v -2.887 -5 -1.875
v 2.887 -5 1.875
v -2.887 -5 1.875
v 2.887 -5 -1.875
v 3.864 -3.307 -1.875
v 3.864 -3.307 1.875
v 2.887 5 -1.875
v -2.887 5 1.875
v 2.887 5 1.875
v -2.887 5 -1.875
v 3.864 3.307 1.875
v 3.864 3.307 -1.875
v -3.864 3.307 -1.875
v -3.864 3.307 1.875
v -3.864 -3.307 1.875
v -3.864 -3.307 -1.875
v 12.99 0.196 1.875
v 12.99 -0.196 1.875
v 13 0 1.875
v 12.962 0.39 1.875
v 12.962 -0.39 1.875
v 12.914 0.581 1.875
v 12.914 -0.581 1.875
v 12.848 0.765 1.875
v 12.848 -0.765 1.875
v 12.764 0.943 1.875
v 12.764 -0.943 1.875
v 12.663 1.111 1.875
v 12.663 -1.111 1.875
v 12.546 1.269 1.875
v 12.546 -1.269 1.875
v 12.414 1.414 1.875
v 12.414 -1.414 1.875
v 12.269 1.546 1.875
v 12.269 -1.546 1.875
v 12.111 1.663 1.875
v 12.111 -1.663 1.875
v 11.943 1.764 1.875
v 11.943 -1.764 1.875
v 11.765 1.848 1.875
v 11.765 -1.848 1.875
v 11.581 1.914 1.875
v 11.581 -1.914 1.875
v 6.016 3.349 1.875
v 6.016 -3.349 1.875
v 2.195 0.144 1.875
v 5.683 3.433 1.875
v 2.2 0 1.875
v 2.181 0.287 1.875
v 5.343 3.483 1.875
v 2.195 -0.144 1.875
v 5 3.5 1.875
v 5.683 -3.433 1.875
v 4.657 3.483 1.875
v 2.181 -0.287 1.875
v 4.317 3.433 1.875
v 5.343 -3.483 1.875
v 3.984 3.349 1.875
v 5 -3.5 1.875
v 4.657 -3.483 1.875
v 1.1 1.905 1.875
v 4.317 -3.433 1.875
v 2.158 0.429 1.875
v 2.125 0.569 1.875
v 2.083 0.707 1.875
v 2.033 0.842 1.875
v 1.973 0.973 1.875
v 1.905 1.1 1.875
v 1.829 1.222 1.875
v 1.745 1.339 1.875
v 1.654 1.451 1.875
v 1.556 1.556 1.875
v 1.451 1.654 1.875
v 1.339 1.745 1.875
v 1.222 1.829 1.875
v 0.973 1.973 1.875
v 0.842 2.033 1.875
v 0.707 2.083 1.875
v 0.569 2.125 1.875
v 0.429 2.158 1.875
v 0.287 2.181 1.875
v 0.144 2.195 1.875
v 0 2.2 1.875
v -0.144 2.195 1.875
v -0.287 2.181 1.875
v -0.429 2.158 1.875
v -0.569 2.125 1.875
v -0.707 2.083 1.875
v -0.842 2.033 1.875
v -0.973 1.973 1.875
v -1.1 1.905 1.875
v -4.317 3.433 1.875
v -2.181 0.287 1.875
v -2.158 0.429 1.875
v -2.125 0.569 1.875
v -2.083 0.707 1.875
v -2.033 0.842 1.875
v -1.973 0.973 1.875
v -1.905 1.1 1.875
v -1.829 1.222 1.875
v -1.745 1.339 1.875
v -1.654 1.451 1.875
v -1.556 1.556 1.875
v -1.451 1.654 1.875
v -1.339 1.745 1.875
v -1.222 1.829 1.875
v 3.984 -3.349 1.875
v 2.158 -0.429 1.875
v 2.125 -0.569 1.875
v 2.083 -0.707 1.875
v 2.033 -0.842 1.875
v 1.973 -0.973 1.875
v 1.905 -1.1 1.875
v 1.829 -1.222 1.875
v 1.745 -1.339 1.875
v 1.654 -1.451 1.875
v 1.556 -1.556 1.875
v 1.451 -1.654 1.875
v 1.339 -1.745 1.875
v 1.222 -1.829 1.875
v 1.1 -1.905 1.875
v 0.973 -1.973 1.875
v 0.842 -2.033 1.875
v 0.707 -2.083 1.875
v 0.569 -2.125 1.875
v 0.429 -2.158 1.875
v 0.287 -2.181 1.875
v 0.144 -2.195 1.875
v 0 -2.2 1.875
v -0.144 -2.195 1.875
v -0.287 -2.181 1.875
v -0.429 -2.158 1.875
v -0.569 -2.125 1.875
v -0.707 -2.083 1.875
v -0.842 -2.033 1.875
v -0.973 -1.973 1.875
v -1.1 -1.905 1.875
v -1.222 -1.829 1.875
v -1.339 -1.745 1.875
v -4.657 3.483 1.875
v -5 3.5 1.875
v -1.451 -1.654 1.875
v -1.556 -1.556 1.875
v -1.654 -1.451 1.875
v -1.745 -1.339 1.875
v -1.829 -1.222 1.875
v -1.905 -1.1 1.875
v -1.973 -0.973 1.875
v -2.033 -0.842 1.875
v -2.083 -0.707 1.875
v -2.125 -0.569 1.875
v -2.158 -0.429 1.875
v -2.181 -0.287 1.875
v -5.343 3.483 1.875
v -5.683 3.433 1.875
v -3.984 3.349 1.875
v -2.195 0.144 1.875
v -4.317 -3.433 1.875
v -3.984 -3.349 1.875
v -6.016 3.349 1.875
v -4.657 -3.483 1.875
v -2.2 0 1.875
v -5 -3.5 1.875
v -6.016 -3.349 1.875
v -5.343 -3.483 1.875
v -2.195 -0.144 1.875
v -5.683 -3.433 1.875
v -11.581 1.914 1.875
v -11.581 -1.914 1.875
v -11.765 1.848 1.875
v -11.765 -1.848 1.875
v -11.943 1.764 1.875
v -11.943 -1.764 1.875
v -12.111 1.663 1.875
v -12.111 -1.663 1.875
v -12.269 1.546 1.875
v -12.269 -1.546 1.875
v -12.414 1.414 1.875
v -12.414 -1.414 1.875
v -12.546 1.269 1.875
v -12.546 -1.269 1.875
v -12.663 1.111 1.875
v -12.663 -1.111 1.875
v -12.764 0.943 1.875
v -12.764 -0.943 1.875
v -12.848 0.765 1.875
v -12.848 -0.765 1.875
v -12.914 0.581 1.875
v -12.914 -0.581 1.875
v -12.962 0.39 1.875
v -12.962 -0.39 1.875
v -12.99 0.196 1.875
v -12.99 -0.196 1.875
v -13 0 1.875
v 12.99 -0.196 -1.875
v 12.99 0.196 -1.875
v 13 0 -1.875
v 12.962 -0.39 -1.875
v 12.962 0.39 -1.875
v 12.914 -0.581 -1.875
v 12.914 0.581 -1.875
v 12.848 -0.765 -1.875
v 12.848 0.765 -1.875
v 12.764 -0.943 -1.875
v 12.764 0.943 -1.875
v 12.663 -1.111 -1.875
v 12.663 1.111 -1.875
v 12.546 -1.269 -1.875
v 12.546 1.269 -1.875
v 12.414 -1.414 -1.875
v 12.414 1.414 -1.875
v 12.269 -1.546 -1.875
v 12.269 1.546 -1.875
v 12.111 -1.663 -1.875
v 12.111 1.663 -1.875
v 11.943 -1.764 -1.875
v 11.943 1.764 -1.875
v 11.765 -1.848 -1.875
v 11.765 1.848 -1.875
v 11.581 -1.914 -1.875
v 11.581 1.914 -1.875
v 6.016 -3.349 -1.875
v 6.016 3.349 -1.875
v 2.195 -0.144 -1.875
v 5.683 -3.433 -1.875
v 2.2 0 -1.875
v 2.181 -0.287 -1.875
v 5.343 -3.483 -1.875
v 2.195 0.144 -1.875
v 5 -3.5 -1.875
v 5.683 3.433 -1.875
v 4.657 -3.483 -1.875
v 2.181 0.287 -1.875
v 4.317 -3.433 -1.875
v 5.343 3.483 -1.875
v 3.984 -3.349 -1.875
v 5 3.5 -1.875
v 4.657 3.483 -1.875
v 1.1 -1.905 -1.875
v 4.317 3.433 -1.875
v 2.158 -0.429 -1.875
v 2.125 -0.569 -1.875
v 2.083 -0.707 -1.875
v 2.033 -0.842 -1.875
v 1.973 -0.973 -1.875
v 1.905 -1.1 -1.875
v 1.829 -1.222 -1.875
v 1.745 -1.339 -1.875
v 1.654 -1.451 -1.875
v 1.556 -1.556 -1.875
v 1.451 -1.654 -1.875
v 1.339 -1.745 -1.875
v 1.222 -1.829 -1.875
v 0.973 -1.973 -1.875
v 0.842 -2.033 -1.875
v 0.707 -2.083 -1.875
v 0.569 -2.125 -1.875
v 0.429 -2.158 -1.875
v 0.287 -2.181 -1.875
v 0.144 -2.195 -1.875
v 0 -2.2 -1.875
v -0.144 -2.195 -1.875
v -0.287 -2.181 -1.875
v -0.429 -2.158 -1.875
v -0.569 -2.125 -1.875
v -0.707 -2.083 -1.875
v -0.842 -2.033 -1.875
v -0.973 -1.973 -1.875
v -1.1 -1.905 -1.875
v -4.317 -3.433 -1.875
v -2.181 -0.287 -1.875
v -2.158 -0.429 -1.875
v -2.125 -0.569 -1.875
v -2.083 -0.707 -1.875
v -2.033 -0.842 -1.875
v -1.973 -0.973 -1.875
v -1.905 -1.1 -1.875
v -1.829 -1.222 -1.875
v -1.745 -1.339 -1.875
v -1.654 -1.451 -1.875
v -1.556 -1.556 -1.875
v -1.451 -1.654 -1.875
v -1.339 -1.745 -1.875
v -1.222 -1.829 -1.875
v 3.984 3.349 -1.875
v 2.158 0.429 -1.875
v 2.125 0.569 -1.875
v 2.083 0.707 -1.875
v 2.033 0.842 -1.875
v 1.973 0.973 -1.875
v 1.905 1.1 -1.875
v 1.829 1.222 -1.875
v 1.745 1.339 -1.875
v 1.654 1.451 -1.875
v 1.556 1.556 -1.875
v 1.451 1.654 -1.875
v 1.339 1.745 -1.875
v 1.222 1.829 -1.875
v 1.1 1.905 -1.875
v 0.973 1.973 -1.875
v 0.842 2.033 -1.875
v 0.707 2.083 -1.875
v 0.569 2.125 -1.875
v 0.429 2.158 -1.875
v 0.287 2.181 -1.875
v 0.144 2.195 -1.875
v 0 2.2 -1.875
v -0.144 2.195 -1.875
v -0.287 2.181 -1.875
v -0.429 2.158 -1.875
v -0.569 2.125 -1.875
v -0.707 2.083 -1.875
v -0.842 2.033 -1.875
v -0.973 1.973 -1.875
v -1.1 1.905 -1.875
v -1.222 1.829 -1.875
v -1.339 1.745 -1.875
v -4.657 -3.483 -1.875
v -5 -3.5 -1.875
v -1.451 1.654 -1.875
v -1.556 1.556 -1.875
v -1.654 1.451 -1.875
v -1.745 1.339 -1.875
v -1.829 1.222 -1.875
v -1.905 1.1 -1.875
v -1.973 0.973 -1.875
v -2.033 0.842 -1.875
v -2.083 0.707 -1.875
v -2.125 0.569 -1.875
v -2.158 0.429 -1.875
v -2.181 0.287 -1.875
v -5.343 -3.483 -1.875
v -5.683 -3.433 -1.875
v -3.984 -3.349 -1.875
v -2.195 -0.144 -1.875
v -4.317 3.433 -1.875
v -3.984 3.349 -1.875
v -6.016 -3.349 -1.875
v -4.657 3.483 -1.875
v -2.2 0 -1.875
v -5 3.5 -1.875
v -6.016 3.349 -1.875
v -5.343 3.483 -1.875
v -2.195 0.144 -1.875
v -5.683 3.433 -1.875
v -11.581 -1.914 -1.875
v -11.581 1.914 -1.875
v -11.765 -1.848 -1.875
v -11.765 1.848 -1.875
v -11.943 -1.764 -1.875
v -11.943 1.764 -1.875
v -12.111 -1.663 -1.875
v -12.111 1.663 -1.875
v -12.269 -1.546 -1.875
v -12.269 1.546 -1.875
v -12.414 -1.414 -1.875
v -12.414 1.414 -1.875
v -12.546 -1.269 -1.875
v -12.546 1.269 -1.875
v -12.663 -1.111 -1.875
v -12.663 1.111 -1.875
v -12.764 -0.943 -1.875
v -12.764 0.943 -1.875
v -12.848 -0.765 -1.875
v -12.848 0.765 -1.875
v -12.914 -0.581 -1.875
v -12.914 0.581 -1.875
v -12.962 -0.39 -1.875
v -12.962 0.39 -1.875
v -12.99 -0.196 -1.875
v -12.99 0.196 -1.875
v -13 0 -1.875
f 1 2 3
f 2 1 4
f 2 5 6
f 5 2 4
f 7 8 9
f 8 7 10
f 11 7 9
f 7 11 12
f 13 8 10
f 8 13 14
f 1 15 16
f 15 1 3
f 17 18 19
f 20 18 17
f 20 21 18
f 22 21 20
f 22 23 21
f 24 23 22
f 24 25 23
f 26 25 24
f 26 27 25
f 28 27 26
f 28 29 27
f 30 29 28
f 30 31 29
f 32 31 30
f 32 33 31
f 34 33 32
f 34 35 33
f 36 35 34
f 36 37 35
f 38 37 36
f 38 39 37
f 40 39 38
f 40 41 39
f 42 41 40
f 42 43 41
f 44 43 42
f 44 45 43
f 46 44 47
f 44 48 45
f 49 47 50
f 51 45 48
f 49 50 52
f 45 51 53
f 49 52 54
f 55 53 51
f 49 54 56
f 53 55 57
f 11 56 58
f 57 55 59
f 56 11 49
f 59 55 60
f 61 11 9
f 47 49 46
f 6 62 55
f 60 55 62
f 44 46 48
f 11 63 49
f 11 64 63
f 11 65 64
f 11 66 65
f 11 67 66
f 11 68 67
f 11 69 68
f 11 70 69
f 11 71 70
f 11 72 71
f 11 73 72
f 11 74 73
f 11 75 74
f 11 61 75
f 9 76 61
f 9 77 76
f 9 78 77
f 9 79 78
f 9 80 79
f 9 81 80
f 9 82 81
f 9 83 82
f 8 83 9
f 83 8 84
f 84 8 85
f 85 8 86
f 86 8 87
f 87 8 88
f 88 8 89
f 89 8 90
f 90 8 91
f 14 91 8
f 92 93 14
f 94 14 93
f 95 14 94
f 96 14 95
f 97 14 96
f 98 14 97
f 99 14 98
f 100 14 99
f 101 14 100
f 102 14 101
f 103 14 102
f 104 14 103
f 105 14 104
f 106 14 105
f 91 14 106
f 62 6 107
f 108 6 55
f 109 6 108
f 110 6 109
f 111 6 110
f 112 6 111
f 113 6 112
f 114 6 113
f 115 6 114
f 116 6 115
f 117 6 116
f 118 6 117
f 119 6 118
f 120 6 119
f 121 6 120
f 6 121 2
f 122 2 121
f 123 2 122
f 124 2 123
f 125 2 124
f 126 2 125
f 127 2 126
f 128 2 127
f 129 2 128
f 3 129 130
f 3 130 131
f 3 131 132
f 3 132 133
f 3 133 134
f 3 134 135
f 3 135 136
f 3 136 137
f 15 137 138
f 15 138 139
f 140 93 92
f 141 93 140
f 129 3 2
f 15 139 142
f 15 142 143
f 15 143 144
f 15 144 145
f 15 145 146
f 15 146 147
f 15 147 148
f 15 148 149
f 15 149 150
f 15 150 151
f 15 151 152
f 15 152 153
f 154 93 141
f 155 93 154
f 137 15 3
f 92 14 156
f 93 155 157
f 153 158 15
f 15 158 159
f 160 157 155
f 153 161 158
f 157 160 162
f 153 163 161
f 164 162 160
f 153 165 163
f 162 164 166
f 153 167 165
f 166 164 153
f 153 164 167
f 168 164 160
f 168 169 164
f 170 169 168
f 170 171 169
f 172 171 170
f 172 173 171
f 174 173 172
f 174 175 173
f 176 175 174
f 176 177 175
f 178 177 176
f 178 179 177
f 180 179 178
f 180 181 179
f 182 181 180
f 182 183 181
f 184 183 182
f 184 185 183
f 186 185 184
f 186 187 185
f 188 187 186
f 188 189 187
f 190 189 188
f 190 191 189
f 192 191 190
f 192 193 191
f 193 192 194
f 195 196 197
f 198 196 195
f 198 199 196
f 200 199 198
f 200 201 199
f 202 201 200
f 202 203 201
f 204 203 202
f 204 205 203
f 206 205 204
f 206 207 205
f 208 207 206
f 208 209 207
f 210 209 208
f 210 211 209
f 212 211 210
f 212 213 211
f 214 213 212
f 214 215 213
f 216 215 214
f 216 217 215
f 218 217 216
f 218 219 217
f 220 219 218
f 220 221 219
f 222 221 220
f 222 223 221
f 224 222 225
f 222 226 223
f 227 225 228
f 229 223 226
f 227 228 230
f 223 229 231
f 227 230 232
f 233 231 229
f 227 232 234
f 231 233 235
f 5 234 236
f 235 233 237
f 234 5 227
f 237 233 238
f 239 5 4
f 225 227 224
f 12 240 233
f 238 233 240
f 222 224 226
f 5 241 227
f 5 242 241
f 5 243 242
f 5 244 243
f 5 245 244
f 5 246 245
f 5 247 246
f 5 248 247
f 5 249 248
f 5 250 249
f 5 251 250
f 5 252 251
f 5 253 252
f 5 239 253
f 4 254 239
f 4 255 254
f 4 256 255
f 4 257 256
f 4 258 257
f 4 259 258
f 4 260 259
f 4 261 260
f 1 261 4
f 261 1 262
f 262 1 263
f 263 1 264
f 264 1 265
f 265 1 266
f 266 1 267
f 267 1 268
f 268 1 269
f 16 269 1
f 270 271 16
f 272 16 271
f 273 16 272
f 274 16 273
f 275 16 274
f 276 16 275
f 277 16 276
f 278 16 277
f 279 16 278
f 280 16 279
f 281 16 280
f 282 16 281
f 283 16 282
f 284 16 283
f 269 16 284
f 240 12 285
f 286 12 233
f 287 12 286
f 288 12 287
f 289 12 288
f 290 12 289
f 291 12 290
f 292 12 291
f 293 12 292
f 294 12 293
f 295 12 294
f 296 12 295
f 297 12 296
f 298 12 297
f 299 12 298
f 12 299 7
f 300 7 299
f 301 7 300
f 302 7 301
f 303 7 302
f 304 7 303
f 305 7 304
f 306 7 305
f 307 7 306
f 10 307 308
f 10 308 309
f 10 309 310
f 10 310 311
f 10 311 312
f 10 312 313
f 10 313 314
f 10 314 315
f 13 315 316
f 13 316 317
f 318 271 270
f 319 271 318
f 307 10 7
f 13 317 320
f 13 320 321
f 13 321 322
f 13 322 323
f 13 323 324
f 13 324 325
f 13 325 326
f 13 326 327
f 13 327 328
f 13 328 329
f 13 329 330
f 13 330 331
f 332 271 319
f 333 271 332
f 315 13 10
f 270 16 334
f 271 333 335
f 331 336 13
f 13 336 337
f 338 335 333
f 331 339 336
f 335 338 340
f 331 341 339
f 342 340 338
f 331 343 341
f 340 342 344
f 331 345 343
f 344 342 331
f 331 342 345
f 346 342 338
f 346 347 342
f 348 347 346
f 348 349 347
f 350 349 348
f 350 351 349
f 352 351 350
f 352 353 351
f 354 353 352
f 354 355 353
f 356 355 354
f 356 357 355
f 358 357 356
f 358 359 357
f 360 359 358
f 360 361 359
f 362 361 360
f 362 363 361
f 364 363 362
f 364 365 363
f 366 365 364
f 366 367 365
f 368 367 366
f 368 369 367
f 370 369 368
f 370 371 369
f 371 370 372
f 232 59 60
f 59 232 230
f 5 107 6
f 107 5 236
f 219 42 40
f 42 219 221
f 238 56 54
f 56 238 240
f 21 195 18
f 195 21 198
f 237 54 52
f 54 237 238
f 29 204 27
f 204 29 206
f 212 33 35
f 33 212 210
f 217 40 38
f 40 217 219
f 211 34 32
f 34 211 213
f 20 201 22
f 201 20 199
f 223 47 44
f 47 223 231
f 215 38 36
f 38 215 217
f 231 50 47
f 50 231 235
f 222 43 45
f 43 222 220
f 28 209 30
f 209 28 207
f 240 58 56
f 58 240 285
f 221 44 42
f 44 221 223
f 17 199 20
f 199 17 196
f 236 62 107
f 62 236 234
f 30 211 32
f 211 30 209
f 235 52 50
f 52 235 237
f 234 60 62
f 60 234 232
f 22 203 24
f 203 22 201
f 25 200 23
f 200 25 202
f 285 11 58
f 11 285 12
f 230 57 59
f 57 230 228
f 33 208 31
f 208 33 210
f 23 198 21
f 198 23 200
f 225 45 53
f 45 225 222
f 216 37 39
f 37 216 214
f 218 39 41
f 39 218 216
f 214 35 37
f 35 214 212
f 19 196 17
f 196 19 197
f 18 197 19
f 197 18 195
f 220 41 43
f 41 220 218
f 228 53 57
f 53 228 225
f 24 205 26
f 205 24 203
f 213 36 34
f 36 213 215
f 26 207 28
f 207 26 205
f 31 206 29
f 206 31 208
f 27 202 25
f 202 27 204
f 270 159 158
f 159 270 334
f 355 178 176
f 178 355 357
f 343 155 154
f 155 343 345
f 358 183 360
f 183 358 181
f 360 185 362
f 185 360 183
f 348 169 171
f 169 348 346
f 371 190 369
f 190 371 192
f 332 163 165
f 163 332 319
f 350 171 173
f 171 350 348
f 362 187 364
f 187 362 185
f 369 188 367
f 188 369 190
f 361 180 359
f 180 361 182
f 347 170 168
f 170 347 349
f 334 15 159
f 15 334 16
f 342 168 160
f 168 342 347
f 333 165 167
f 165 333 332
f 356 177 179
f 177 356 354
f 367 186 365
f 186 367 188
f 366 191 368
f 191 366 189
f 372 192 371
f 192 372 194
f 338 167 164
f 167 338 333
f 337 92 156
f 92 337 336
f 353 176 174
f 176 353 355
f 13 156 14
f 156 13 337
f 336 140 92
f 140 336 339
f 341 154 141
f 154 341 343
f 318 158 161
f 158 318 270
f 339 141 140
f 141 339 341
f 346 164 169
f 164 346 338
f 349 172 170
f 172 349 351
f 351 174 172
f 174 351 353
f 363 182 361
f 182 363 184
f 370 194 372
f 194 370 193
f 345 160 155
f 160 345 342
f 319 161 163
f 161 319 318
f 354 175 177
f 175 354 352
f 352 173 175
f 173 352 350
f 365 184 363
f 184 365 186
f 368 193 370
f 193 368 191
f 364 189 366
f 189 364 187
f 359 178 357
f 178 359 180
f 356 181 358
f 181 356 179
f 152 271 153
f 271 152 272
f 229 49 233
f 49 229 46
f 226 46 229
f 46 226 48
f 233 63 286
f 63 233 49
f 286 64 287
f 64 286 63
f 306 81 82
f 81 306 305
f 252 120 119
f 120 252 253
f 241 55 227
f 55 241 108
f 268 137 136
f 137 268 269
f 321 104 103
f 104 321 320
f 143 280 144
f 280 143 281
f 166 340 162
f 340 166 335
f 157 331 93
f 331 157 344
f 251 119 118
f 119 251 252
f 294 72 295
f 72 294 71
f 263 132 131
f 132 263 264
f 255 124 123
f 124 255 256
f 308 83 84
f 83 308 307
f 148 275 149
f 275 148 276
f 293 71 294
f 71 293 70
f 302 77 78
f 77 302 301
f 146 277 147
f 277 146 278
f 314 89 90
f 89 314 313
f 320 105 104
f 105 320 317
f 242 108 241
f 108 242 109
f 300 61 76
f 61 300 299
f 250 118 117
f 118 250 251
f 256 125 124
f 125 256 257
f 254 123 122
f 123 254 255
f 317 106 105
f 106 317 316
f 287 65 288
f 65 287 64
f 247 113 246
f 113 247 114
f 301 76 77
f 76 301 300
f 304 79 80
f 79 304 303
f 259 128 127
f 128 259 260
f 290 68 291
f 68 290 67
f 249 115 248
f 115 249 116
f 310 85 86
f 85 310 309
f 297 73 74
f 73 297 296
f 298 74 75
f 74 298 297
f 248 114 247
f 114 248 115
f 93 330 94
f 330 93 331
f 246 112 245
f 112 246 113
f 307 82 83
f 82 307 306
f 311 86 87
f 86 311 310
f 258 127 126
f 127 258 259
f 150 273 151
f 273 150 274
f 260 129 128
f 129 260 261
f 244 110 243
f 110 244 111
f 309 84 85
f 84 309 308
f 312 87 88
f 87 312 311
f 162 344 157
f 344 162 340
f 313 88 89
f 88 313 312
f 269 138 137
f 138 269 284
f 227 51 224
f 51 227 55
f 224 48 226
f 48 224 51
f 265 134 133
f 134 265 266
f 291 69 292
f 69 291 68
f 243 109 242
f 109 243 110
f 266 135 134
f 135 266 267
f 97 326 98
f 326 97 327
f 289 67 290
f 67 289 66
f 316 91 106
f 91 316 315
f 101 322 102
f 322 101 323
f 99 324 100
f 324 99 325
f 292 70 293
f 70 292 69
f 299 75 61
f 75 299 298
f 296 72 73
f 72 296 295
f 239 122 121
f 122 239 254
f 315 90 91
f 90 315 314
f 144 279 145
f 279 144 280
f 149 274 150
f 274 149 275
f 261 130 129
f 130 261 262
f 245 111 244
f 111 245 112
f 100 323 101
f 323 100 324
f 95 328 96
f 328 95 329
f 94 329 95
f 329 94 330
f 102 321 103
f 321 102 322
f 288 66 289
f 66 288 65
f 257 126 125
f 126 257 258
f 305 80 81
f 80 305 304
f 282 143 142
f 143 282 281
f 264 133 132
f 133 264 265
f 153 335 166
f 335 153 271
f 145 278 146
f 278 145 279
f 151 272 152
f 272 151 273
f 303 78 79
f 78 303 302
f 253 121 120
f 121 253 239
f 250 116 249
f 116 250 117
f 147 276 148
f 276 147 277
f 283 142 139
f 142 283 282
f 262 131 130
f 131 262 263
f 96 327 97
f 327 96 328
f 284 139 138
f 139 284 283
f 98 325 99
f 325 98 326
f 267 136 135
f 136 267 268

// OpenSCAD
$fn=96;

screw_d = 4.0;
clearance = 0.4;
hole_d = screw_d + clearance;

across_flats = 10.0;
thickness = 3.75;

wing_span = 22.0;
wing_width = 7.0;
wing_tip_r = 2.0;

hub_r = across_flats / sqrt(3);
hub_flat_r = across_flats / 2;

module hex_prism(af, h){
    r = af / sqrt(3);
    cylinder(h=h, r=r, $fn=6, center=true);
}

module wing2d(len, w, tipr){
    hull(){
        translate([0,0]) circle(r=w/2, $fn=64);
        translate([len,0]) circle(r=tipr, $fn=64);
    }
}

module wing3d(len, w, tipr, h){
    linear_extrude(height=h, center=true, convexity=10)
        wing2d(len, w, tipr);
}

module wingnut_body(){
    union(){
        hex_prism(across_flats, thickness);
        translate([hub_flat_r,0,0]) wing3d(wing_span/2 - hub_flat_r, wing_width, wing_tip_r, thickness);
        mirror([1,0,0]) translate([hub_flat_r,0,0]) wing3d(wing_span/2 - hub_flat_r, wing_width, wing_tip_r, thickness);
    }
}

difference(){
    wingnut_body();
    cylinder(h=thickness+2, d=hole_d, center=true, $fn=96);
}
